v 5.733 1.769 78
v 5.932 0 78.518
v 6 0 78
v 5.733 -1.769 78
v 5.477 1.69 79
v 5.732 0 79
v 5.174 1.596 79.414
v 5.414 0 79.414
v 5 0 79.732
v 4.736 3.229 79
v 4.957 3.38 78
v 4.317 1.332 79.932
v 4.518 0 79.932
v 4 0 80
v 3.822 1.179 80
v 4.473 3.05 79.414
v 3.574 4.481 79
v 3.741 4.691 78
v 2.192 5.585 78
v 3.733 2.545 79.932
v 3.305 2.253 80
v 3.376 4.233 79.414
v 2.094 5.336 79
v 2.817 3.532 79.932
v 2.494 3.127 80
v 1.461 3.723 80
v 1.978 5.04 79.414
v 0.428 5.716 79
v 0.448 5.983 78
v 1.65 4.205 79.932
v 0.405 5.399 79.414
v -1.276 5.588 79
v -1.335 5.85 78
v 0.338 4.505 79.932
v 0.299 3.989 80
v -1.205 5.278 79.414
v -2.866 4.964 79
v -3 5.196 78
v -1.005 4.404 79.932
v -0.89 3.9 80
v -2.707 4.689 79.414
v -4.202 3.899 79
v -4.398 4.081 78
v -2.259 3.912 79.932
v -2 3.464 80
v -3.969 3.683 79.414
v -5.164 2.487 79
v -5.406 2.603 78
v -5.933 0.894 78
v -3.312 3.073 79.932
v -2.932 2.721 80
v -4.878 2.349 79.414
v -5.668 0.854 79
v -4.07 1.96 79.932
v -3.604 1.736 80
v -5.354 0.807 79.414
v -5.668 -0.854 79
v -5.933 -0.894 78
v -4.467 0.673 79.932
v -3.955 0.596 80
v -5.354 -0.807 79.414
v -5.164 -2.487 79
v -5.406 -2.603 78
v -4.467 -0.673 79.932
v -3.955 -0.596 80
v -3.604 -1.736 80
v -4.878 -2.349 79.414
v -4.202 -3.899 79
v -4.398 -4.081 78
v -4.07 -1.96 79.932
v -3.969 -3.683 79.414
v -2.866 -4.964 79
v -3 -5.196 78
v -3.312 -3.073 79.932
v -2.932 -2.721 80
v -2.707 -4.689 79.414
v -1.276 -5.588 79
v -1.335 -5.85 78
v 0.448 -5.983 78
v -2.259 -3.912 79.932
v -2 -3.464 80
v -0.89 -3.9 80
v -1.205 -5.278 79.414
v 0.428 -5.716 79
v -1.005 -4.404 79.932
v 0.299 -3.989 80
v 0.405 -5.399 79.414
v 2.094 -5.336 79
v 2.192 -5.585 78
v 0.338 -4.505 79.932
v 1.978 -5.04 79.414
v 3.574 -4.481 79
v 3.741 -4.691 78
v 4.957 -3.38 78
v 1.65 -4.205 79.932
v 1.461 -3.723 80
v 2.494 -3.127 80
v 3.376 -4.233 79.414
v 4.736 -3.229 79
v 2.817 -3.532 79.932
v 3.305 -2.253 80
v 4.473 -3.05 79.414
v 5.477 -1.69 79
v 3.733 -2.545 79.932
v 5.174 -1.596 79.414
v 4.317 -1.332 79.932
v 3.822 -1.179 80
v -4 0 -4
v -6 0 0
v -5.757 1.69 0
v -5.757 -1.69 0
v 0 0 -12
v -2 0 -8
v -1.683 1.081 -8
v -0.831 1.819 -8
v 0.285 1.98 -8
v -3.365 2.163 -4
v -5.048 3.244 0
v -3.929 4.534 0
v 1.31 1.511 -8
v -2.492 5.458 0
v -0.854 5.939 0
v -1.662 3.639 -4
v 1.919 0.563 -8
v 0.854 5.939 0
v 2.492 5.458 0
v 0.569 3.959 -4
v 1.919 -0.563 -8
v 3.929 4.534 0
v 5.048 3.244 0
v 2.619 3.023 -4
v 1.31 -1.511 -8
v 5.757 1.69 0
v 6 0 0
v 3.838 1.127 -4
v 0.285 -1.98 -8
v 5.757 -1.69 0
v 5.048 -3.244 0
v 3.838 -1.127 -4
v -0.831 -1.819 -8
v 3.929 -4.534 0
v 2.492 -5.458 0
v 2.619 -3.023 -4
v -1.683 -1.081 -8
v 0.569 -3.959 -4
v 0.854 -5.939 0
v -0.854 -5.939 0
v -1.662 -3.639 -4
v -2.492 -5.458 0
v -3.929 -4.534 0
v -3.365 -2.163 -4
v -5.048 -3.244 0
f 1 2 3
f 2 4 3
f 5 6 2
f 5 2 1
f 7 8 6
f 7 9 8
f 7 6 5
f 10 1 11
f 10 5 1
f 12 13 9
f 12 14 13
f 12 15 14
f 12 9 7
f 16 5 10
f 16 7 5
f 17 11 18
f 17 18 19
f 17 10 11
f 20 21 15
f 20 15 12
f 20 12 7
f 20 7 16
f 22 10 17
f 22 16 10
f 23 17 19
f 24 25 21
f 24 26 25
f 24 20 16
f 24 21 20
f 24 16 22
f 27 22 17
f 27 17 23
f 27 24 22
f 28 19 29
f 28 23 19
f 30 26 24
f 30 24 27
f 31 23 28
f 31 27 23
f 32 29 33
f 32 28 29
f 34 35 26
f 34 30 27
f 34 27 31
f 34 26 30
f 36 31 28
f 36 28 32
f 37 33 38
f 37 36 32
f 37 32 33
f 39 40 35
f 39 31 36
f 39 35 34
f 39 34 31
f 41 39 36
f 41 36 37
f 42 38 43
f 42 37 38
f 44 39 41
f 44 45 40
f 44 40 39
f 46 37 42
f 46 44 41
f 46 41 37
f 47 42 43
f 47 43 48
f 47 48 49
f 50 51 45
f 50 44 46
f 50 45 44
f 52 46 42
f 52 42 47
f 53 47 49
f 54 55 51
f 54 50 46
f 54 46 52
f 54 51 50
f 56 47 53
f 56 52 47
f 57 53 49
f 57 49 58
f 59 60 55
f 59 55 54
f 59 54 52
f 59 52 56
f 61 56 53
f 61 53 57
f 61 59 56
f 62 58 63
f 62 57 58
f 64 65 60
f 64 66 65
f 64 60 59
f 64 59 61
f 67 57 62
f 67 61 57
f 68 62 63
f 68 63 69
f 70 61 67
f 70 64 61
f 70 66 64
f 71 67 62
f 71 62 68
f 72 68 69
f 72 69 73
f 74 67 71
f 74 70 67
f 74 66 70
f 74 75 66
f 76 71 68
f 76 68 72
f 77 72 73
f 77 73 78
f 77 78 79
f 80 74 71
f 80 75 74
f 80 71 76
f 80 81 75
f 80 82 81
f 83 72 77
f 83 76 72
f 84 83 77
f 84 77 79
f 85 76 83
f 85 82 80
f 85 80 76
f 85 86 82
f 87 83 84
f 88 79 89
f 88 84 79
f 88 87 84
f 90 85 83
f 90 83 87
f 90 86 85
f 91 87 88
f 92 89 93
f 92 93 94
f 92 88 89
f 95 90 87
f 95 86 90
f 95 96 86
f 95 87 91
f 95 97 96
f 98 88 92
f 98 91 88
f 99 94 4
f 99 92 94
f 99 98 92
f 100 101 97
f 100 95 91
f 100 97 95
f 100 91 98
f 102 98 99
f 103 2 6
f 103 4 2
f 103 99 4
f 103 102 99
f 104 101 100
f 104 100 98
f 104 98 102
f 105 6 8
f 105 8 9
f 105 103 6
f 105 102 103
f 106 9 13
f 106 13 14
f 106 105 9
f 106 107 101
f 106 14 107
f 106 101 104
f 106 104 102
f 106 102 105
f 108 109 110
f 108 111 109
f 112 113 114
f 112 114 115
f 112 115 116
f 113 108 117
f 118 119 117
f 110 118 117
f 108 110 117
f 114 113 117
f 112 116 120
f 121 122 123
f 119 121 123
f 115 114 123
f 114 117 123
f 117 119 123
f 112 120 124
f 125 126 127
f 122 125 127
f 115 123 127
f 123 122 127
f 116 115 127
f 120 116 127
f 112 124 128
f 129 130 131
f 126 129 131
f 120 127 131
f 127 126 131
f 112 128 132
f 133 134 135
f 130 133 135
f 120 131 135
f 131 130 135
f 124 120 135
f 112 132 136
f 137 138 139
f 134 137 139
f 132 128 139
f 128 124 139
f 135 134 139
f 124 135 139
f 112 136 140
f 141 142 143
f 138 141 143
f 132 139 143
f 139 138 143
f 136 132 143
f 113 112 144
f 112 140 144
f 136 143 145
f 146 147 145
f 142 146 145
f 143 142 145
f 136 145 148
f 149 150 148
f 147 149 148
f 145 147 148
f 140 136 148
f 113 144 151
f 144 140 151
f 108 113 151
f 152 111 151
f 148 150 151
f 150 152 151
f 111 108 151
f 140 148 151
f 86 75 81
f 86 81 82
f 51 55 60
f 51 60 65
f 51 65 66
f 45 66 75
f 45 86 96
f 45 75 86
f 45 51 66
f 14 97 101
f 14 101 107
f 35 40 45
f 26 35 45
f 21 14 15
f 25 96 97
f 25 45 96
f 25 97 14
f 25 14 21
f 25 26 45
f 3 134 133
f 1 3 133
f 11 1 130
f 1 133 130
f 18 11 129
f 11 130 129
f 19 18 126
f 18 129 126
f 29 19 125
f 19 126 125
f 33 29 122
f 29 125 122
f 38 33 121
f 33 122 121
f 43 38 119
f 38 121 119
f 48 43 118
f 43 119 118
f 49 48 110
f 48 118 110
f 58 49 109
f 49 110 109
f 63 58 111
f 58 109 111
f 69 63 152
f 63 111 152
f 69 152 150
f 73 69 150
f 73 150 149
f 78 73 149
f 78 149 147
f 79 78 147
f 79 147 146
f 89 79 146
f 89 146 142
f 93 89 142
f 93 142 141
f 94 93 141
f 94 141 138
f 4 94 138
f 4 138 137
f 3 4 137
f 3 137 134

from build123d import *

# Parameters (mm, degrees)
ESQUISSE1_R        = 6
BOSS_EXTRU_1_DEPTH = 80
CONG_1_R           = 2


with BuildPart() as part:
    # Esquisse1 → Boss.-Extru.1 (new body)
    with BuildSketch(Plane.XY):
        Circle(ESQUISSE1_R)
    extrude(amount=BOSS_EXTRU_1_DEPTH)

    # Esquisse4 → Révolution1 (revolve)
    with BuildSketch(Plane(origin=(0, 0, 0), x_dir=(1, 0, 0), z_dir=(0, 1, 0))):
        Polygon((0, 0), (0, 12), (-6, 0), align=None)
    revolve(axis=Axis((0, 0, 0), (0, 0, -1)))

    # Congé1
    cong_1_edges = [part.edges().sort_by_distance(p)[0] for p in [
        (-6, 0, 80),
    ]]
    fillet(cong_1_edges, radius=CONG_1_R)


solid = part.part
